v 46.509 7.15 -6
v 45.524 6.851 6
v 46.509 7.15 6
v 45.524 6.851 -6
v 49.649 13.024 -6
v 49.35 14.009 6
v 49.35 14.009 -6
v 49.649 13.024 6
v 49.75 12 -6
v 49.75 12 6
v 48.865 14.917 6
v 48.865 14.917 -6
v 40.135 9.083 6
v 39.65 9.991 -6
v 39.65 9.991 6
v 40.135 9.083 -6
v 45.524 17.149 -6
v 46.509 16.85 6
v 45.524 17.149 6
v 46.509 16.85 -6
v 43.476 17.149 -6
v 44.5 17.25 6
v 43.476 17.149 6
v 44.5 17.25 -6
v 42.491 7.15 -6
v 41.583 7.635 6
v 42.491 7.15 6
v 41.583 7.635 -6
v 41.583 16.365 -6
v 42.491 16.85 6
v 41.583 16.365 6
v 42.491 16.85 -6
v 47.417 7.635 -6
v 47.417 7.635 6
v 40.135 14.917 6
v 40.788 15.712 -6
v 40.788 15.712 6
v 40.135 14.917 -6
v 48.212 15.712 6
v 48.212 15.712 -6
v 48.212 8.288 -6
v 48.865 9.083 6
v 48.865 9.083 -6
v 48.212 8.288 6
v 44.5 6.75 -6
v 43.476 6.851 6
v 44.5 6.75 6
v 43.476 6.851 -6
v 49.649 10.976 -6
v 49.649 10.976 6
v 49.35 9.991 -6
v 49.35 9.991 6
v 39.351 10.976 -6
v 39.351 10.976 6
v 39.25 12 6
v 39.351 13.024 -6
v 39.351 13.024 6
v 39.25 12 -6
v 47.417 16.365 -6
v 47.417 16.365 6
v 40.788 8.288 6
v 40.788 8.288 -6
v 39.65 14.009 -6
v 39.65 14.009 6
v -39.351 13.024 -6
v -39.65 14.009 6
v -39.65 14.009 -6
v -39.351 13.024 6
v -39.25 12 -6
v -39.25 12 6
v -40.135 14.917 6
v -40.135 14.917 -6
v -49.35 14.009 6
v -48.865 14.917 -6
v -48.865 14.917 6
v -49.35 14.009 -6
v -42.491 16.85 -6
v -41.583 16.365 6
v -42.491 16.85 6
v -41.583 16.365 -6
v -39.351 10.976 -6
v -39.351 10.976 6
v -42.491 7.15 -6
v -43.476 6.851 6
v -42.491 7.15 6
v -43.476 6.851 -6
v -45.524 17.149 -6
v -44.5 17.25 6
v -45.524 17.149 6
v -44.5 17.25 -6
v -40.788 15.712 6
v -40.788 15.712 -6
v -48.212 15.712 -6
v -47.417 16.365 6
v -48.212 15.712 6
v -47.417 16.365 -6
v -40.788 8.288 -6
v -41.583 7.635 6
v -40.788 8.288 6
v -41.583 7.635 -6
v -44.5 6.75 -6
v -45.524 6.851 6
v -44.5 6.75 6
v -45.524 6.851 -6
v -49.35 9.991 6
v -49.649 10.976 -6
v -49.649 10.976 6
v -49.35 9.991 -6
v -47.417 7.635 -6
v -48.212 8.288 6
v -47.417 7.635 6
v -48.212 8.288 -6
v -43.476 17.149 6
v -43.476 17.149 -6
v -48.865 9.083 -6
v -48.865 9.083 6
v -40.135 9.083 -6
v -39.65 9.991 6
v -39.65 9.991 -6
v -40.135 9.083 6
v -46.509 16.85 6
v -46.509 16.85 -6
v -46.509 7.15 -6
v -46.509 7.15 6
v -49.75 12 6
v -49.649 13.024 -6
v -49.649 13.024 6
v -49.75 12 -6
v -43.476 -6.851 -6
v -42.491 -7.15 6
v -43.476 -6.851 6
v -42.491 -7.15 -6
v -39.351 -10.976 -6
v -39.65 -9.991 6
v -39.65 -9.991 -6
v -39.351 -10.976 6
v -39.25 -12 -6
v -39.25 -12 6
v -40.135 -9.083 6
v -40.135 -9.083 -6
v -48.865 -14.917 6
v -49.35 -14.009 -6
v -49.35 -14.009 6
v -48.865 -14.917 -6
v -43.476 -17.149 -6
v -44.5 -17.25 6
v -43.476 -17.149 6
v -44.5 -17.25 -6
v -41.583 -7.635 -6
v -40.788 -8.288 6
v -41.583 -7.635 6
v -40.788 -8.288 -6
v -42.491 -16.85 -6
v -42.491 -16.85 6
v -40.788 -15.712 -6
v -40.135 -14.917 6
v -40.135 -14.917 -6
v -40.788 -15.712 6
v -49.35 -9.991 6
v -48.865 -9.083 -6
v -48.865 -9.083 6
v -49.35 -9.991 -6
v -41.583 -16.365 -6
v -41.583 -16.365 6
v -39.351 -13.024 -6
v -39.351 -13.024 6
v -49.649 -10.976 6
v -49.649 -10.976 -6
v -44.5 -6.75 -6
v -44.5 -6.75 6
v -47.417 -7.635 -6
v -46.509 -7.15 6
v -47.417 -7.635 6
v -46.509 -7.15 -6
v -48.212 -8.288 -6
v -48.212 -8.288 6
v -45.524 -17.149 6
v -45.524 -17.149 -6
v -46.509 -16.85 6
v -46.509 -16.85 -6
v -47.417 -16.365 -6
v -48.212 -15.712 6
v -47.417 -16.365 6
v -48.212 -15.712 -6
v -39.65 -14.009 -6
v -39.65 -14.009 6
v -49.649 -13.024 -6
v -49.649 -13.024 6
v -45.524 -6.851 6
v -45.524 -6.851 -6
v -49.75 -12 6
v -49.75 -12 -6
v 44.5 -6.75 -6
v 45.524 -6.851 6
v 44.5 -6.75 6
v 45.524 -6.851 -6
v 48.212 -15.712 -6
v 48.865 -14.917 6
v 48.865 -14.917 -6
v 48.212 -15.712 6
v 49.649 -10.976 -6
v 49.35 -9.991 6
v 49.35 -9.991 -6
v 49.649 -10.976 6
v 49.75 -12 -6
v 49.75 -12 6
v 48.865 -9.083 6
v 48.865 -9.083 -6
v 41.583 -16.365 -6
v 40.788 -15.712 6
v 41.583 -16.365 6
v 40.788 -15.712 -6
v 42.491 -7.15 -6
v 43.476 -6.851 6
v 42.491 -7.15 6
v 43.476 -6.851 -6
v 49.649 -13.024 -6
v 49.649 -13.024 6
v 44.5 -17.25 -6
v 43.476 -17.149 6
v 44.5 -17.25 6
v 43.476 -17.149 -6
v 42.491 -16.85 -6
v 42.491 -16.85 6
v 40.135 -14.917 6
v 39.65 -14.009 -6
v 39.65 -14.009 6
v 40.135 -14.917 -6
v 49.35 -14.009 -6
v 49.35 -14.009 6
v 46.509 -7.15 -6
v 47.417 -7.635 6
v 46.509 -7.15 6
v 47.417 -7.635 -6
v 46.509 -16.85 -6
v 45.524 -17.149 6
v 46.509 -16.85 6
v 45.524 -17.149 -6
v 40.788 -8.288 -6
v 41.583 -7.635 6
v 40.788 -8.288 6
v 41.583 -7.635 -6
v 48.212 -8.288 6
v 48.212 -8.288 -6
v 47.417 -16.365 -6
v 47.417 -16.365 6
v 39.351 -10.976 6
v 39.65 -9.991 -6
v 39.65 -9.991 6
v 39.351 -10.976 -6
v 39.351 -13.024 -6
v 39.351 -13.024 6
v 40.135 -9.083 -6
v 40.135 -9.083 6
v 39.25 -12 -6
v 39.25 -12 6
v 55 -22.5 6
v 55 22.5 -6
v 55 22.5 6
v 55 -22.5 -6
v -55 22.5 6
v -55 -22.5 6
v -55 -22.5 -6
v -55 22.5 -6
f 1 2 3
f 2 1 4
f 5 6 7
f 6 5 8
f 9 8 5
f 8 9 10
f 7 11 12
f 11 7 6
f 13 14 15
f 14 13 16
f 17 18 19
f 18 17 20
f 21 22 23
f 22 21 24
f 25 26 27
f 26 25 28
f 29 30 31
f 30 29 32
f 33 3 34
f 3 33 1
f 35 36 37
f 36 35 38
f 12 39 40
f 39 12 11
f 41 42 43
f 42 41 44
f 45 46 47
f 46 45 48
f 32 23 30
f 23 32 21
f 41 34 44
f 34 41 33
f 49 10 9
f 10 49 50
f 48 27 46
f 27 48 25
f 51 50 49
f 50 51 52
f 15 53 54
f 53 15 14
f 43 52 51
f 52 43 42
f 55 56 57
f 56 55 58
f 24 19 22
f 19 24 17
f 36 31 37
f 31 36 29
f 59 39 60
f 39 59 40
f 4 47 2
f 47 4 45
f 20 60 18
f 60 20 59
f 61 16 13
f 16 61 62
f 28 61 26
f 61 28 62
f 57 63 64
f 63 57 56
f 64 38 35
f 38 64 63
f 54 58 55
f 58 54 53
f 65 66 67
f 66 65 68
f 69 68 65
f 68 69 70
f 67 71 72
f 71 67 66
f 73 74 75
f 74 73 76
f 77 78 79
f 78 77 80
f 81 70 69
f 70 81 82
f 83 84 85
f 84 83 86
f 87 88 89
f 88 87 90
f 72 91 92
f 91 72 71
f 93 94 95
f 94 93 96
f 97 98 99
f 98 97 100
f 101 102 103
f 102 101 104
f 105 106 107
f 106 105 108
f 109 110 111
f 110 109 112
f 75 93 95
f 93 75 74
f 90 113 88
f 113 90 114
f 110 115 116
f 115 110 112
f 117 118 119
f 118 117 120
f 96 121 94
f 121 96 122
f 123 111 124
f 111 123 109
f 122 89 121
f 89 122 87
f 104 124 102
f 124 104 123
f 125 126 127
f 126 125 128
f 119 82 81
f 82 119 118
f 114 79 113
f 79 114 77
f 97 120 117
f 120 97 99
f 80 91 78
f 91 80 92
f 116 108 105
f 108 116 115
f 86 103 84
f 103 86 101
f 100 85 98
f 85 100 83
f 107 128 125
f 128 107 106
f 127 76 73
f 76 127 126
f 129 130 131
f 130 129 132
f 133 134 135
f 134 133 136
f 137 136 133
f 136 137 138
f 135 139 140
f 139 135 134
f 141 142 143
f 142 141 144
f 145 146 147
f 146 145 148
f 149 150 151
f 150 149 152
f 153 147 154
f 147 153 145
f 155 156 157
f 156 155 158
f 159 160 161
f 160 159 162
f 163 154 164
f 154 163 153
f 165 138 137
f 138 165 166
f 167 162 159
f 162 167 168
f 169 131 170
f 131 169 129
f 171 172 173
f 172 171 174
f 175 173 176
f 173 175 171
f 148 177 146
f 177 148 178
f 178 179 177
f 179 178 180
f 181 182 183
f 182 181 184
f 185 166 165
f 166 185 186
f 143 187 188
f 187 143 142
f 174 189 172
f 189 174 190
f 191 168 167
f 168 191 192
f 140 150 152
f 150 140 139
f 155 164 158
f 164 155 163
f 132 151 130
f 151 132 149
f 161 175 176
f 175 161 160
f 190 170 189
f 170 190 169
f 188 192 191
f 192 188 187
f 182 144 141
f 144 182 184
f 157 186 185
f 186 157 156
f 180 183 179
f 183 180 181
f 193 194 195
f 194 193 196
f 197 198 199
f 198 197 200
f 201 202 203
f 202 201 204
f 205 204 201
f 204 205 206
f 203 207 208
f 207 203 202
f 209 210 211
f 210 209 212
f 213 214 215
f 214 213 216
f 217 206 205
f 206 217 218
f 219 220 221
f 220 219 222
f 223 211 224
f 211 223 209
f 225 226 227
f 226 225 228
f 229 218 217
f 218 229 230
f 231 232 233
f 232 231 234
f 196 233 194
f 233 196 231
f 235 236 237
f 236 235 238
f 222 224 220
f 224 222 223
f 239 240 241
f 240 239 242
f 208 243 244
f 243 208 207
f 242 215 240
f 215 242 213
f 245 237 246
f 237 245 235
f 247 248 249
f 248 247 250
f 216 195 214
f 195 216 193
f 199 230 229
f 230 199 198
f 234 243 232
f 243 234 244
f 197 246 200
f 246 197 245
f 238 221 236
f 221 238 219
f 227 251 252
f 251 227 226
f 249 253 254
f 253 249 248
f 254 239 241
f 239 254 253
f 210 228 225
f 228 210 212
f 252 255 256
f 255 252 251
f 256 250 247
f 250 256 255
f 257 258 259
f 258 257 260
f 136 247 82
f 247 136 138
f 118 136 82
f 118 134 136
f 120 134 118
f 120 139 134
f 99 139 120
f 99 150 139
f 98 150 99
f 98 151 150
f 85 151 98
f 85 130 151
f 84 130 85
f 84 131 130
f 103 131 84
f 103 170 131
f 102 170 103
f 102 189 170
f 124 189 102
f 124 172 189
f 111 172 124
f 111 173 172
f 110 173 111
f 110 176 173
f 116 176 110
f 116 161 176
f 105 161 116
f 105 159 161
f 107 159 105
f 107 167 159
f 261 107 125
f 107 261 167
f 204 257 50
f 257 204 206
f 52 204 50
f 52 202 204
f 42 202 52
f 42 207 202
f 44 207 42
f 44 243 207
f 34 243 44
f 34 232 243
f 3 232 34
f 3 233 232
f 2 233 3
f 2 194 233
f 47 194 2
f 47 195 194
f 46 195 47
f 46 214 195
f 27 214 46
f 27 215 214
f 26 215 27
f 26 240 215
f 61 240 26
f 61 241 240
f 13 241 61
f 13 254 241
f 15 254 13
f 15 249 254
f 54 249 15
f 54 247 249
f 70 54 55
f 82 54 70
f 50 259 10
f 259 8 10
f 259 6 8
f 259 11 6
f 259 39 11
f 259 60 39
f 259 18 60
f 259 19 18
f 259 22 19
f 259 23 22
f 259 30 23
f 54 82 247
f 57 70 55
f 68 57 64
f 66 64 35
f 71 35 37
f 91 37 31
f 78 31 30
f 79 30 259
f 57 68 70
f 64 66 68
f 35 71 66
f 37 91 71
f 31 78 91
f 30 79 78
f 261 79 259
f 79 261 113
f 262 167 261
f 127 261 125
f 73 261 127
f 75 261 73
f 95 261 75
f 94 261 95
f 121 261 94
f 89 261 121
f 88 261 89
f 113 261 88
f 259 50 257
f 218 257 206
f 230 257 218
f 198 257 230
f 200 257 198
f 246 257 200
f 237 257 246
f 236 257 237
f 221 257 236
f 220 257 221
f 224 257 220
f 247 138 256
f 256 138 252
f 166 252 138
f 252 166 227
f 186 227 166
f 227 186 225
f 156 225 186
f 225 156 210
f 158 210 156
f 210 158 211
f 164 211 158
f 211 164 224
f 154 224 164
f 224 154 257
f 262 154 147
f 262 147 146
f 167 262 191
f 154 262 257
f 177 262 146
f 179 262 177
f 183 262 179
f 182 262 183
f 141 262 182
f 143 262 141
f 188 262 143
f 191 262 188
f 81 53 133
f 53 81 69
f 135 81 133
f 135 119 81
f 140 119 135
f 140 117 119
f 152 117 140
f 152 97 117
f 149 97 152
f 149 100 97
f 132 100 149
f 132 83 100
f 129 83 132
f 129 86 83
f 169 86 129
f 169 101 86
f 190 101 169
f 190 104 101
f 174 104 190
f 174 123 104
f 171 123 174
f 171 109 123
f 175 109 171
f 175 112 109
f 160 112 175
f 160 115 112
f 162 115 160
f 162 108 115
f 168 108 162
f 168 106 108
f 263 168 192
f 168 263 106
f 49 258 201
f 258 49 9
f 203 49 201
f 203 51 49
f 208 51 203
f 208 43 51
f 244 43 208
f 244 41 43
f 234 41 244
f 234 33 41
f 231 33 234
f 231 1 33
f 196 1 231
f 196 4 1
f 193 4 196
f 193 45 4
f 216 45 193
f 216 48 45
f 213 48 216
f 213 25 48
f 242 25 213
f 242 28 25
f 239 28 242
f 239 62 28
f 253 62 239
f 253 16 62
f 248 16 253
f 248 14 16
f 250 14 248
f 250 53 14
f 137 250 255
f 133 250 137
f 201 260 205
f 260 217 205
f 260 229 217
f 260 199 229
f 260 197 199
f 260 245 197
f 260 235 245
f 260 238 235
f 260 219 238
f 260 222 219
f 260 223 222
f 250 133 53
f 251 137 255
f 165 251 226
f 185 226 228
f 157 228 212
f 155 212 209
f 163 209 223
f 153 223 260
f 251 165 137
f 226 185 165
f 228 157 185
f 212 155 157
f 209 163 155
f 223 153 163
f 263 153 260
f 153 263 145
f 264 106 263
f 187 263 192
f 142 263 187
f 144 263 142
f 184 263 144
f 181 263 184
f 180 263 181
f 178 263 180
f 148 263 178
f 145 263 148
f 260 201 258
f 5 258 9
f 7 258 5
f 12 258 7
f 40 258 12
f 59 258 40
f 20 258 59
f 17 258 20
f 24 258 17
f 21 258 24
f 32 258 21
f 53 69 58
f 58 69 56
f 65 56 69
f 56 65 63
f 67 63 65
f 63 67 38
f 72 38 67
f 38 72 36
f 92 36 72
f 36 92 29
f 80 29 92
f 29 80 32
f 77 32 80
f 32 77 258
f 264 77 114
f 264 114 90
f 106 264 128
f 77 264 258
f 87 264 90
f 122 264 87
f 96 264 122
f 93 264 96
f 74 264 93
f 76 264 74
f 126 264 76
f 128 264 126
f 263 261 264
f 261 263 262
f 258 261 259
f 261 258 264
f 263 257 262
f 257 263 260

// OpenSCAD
$fn = 32;

// ----------------------------------------------------------------------
// Corner plate 110 x 45 x 12
// 4 holes, centres taken from the edge offset
// ----------------------------------------------------------------------

// --- parameters (mm) ---
plate = [110, 45, 12];  // overall size (x, y, z)
holes = 4;              // number of holes the drawing asks for
hole_d = 10.5;          // hole diameter
edge = 10.5;            // hole centre offset from the plate edge

// --- derived feature positions (mm) ---
corner_x = plate[0] / 2 - edge;  // = 44.5   corner hole X
corner_y = plate[1] / 2 - edge;  // = 12   corner hole Y
feature_centers = [
  [corner_x, corner_y],
  [-corner_x, corner_y],
  [-corner_x, -corner_y],
  [corner_x, -corner_y]
];   // hole centres the loop below drills

// plate outline, every hole drilled through with the same cutters
difference() {
  cube(plate, center = true);
  for (centre = feature_centers)
    translate([centre[0], centre[1], 0])
      cylinder(d = hole_d, h = plate[2] + 2, center = true);
}
